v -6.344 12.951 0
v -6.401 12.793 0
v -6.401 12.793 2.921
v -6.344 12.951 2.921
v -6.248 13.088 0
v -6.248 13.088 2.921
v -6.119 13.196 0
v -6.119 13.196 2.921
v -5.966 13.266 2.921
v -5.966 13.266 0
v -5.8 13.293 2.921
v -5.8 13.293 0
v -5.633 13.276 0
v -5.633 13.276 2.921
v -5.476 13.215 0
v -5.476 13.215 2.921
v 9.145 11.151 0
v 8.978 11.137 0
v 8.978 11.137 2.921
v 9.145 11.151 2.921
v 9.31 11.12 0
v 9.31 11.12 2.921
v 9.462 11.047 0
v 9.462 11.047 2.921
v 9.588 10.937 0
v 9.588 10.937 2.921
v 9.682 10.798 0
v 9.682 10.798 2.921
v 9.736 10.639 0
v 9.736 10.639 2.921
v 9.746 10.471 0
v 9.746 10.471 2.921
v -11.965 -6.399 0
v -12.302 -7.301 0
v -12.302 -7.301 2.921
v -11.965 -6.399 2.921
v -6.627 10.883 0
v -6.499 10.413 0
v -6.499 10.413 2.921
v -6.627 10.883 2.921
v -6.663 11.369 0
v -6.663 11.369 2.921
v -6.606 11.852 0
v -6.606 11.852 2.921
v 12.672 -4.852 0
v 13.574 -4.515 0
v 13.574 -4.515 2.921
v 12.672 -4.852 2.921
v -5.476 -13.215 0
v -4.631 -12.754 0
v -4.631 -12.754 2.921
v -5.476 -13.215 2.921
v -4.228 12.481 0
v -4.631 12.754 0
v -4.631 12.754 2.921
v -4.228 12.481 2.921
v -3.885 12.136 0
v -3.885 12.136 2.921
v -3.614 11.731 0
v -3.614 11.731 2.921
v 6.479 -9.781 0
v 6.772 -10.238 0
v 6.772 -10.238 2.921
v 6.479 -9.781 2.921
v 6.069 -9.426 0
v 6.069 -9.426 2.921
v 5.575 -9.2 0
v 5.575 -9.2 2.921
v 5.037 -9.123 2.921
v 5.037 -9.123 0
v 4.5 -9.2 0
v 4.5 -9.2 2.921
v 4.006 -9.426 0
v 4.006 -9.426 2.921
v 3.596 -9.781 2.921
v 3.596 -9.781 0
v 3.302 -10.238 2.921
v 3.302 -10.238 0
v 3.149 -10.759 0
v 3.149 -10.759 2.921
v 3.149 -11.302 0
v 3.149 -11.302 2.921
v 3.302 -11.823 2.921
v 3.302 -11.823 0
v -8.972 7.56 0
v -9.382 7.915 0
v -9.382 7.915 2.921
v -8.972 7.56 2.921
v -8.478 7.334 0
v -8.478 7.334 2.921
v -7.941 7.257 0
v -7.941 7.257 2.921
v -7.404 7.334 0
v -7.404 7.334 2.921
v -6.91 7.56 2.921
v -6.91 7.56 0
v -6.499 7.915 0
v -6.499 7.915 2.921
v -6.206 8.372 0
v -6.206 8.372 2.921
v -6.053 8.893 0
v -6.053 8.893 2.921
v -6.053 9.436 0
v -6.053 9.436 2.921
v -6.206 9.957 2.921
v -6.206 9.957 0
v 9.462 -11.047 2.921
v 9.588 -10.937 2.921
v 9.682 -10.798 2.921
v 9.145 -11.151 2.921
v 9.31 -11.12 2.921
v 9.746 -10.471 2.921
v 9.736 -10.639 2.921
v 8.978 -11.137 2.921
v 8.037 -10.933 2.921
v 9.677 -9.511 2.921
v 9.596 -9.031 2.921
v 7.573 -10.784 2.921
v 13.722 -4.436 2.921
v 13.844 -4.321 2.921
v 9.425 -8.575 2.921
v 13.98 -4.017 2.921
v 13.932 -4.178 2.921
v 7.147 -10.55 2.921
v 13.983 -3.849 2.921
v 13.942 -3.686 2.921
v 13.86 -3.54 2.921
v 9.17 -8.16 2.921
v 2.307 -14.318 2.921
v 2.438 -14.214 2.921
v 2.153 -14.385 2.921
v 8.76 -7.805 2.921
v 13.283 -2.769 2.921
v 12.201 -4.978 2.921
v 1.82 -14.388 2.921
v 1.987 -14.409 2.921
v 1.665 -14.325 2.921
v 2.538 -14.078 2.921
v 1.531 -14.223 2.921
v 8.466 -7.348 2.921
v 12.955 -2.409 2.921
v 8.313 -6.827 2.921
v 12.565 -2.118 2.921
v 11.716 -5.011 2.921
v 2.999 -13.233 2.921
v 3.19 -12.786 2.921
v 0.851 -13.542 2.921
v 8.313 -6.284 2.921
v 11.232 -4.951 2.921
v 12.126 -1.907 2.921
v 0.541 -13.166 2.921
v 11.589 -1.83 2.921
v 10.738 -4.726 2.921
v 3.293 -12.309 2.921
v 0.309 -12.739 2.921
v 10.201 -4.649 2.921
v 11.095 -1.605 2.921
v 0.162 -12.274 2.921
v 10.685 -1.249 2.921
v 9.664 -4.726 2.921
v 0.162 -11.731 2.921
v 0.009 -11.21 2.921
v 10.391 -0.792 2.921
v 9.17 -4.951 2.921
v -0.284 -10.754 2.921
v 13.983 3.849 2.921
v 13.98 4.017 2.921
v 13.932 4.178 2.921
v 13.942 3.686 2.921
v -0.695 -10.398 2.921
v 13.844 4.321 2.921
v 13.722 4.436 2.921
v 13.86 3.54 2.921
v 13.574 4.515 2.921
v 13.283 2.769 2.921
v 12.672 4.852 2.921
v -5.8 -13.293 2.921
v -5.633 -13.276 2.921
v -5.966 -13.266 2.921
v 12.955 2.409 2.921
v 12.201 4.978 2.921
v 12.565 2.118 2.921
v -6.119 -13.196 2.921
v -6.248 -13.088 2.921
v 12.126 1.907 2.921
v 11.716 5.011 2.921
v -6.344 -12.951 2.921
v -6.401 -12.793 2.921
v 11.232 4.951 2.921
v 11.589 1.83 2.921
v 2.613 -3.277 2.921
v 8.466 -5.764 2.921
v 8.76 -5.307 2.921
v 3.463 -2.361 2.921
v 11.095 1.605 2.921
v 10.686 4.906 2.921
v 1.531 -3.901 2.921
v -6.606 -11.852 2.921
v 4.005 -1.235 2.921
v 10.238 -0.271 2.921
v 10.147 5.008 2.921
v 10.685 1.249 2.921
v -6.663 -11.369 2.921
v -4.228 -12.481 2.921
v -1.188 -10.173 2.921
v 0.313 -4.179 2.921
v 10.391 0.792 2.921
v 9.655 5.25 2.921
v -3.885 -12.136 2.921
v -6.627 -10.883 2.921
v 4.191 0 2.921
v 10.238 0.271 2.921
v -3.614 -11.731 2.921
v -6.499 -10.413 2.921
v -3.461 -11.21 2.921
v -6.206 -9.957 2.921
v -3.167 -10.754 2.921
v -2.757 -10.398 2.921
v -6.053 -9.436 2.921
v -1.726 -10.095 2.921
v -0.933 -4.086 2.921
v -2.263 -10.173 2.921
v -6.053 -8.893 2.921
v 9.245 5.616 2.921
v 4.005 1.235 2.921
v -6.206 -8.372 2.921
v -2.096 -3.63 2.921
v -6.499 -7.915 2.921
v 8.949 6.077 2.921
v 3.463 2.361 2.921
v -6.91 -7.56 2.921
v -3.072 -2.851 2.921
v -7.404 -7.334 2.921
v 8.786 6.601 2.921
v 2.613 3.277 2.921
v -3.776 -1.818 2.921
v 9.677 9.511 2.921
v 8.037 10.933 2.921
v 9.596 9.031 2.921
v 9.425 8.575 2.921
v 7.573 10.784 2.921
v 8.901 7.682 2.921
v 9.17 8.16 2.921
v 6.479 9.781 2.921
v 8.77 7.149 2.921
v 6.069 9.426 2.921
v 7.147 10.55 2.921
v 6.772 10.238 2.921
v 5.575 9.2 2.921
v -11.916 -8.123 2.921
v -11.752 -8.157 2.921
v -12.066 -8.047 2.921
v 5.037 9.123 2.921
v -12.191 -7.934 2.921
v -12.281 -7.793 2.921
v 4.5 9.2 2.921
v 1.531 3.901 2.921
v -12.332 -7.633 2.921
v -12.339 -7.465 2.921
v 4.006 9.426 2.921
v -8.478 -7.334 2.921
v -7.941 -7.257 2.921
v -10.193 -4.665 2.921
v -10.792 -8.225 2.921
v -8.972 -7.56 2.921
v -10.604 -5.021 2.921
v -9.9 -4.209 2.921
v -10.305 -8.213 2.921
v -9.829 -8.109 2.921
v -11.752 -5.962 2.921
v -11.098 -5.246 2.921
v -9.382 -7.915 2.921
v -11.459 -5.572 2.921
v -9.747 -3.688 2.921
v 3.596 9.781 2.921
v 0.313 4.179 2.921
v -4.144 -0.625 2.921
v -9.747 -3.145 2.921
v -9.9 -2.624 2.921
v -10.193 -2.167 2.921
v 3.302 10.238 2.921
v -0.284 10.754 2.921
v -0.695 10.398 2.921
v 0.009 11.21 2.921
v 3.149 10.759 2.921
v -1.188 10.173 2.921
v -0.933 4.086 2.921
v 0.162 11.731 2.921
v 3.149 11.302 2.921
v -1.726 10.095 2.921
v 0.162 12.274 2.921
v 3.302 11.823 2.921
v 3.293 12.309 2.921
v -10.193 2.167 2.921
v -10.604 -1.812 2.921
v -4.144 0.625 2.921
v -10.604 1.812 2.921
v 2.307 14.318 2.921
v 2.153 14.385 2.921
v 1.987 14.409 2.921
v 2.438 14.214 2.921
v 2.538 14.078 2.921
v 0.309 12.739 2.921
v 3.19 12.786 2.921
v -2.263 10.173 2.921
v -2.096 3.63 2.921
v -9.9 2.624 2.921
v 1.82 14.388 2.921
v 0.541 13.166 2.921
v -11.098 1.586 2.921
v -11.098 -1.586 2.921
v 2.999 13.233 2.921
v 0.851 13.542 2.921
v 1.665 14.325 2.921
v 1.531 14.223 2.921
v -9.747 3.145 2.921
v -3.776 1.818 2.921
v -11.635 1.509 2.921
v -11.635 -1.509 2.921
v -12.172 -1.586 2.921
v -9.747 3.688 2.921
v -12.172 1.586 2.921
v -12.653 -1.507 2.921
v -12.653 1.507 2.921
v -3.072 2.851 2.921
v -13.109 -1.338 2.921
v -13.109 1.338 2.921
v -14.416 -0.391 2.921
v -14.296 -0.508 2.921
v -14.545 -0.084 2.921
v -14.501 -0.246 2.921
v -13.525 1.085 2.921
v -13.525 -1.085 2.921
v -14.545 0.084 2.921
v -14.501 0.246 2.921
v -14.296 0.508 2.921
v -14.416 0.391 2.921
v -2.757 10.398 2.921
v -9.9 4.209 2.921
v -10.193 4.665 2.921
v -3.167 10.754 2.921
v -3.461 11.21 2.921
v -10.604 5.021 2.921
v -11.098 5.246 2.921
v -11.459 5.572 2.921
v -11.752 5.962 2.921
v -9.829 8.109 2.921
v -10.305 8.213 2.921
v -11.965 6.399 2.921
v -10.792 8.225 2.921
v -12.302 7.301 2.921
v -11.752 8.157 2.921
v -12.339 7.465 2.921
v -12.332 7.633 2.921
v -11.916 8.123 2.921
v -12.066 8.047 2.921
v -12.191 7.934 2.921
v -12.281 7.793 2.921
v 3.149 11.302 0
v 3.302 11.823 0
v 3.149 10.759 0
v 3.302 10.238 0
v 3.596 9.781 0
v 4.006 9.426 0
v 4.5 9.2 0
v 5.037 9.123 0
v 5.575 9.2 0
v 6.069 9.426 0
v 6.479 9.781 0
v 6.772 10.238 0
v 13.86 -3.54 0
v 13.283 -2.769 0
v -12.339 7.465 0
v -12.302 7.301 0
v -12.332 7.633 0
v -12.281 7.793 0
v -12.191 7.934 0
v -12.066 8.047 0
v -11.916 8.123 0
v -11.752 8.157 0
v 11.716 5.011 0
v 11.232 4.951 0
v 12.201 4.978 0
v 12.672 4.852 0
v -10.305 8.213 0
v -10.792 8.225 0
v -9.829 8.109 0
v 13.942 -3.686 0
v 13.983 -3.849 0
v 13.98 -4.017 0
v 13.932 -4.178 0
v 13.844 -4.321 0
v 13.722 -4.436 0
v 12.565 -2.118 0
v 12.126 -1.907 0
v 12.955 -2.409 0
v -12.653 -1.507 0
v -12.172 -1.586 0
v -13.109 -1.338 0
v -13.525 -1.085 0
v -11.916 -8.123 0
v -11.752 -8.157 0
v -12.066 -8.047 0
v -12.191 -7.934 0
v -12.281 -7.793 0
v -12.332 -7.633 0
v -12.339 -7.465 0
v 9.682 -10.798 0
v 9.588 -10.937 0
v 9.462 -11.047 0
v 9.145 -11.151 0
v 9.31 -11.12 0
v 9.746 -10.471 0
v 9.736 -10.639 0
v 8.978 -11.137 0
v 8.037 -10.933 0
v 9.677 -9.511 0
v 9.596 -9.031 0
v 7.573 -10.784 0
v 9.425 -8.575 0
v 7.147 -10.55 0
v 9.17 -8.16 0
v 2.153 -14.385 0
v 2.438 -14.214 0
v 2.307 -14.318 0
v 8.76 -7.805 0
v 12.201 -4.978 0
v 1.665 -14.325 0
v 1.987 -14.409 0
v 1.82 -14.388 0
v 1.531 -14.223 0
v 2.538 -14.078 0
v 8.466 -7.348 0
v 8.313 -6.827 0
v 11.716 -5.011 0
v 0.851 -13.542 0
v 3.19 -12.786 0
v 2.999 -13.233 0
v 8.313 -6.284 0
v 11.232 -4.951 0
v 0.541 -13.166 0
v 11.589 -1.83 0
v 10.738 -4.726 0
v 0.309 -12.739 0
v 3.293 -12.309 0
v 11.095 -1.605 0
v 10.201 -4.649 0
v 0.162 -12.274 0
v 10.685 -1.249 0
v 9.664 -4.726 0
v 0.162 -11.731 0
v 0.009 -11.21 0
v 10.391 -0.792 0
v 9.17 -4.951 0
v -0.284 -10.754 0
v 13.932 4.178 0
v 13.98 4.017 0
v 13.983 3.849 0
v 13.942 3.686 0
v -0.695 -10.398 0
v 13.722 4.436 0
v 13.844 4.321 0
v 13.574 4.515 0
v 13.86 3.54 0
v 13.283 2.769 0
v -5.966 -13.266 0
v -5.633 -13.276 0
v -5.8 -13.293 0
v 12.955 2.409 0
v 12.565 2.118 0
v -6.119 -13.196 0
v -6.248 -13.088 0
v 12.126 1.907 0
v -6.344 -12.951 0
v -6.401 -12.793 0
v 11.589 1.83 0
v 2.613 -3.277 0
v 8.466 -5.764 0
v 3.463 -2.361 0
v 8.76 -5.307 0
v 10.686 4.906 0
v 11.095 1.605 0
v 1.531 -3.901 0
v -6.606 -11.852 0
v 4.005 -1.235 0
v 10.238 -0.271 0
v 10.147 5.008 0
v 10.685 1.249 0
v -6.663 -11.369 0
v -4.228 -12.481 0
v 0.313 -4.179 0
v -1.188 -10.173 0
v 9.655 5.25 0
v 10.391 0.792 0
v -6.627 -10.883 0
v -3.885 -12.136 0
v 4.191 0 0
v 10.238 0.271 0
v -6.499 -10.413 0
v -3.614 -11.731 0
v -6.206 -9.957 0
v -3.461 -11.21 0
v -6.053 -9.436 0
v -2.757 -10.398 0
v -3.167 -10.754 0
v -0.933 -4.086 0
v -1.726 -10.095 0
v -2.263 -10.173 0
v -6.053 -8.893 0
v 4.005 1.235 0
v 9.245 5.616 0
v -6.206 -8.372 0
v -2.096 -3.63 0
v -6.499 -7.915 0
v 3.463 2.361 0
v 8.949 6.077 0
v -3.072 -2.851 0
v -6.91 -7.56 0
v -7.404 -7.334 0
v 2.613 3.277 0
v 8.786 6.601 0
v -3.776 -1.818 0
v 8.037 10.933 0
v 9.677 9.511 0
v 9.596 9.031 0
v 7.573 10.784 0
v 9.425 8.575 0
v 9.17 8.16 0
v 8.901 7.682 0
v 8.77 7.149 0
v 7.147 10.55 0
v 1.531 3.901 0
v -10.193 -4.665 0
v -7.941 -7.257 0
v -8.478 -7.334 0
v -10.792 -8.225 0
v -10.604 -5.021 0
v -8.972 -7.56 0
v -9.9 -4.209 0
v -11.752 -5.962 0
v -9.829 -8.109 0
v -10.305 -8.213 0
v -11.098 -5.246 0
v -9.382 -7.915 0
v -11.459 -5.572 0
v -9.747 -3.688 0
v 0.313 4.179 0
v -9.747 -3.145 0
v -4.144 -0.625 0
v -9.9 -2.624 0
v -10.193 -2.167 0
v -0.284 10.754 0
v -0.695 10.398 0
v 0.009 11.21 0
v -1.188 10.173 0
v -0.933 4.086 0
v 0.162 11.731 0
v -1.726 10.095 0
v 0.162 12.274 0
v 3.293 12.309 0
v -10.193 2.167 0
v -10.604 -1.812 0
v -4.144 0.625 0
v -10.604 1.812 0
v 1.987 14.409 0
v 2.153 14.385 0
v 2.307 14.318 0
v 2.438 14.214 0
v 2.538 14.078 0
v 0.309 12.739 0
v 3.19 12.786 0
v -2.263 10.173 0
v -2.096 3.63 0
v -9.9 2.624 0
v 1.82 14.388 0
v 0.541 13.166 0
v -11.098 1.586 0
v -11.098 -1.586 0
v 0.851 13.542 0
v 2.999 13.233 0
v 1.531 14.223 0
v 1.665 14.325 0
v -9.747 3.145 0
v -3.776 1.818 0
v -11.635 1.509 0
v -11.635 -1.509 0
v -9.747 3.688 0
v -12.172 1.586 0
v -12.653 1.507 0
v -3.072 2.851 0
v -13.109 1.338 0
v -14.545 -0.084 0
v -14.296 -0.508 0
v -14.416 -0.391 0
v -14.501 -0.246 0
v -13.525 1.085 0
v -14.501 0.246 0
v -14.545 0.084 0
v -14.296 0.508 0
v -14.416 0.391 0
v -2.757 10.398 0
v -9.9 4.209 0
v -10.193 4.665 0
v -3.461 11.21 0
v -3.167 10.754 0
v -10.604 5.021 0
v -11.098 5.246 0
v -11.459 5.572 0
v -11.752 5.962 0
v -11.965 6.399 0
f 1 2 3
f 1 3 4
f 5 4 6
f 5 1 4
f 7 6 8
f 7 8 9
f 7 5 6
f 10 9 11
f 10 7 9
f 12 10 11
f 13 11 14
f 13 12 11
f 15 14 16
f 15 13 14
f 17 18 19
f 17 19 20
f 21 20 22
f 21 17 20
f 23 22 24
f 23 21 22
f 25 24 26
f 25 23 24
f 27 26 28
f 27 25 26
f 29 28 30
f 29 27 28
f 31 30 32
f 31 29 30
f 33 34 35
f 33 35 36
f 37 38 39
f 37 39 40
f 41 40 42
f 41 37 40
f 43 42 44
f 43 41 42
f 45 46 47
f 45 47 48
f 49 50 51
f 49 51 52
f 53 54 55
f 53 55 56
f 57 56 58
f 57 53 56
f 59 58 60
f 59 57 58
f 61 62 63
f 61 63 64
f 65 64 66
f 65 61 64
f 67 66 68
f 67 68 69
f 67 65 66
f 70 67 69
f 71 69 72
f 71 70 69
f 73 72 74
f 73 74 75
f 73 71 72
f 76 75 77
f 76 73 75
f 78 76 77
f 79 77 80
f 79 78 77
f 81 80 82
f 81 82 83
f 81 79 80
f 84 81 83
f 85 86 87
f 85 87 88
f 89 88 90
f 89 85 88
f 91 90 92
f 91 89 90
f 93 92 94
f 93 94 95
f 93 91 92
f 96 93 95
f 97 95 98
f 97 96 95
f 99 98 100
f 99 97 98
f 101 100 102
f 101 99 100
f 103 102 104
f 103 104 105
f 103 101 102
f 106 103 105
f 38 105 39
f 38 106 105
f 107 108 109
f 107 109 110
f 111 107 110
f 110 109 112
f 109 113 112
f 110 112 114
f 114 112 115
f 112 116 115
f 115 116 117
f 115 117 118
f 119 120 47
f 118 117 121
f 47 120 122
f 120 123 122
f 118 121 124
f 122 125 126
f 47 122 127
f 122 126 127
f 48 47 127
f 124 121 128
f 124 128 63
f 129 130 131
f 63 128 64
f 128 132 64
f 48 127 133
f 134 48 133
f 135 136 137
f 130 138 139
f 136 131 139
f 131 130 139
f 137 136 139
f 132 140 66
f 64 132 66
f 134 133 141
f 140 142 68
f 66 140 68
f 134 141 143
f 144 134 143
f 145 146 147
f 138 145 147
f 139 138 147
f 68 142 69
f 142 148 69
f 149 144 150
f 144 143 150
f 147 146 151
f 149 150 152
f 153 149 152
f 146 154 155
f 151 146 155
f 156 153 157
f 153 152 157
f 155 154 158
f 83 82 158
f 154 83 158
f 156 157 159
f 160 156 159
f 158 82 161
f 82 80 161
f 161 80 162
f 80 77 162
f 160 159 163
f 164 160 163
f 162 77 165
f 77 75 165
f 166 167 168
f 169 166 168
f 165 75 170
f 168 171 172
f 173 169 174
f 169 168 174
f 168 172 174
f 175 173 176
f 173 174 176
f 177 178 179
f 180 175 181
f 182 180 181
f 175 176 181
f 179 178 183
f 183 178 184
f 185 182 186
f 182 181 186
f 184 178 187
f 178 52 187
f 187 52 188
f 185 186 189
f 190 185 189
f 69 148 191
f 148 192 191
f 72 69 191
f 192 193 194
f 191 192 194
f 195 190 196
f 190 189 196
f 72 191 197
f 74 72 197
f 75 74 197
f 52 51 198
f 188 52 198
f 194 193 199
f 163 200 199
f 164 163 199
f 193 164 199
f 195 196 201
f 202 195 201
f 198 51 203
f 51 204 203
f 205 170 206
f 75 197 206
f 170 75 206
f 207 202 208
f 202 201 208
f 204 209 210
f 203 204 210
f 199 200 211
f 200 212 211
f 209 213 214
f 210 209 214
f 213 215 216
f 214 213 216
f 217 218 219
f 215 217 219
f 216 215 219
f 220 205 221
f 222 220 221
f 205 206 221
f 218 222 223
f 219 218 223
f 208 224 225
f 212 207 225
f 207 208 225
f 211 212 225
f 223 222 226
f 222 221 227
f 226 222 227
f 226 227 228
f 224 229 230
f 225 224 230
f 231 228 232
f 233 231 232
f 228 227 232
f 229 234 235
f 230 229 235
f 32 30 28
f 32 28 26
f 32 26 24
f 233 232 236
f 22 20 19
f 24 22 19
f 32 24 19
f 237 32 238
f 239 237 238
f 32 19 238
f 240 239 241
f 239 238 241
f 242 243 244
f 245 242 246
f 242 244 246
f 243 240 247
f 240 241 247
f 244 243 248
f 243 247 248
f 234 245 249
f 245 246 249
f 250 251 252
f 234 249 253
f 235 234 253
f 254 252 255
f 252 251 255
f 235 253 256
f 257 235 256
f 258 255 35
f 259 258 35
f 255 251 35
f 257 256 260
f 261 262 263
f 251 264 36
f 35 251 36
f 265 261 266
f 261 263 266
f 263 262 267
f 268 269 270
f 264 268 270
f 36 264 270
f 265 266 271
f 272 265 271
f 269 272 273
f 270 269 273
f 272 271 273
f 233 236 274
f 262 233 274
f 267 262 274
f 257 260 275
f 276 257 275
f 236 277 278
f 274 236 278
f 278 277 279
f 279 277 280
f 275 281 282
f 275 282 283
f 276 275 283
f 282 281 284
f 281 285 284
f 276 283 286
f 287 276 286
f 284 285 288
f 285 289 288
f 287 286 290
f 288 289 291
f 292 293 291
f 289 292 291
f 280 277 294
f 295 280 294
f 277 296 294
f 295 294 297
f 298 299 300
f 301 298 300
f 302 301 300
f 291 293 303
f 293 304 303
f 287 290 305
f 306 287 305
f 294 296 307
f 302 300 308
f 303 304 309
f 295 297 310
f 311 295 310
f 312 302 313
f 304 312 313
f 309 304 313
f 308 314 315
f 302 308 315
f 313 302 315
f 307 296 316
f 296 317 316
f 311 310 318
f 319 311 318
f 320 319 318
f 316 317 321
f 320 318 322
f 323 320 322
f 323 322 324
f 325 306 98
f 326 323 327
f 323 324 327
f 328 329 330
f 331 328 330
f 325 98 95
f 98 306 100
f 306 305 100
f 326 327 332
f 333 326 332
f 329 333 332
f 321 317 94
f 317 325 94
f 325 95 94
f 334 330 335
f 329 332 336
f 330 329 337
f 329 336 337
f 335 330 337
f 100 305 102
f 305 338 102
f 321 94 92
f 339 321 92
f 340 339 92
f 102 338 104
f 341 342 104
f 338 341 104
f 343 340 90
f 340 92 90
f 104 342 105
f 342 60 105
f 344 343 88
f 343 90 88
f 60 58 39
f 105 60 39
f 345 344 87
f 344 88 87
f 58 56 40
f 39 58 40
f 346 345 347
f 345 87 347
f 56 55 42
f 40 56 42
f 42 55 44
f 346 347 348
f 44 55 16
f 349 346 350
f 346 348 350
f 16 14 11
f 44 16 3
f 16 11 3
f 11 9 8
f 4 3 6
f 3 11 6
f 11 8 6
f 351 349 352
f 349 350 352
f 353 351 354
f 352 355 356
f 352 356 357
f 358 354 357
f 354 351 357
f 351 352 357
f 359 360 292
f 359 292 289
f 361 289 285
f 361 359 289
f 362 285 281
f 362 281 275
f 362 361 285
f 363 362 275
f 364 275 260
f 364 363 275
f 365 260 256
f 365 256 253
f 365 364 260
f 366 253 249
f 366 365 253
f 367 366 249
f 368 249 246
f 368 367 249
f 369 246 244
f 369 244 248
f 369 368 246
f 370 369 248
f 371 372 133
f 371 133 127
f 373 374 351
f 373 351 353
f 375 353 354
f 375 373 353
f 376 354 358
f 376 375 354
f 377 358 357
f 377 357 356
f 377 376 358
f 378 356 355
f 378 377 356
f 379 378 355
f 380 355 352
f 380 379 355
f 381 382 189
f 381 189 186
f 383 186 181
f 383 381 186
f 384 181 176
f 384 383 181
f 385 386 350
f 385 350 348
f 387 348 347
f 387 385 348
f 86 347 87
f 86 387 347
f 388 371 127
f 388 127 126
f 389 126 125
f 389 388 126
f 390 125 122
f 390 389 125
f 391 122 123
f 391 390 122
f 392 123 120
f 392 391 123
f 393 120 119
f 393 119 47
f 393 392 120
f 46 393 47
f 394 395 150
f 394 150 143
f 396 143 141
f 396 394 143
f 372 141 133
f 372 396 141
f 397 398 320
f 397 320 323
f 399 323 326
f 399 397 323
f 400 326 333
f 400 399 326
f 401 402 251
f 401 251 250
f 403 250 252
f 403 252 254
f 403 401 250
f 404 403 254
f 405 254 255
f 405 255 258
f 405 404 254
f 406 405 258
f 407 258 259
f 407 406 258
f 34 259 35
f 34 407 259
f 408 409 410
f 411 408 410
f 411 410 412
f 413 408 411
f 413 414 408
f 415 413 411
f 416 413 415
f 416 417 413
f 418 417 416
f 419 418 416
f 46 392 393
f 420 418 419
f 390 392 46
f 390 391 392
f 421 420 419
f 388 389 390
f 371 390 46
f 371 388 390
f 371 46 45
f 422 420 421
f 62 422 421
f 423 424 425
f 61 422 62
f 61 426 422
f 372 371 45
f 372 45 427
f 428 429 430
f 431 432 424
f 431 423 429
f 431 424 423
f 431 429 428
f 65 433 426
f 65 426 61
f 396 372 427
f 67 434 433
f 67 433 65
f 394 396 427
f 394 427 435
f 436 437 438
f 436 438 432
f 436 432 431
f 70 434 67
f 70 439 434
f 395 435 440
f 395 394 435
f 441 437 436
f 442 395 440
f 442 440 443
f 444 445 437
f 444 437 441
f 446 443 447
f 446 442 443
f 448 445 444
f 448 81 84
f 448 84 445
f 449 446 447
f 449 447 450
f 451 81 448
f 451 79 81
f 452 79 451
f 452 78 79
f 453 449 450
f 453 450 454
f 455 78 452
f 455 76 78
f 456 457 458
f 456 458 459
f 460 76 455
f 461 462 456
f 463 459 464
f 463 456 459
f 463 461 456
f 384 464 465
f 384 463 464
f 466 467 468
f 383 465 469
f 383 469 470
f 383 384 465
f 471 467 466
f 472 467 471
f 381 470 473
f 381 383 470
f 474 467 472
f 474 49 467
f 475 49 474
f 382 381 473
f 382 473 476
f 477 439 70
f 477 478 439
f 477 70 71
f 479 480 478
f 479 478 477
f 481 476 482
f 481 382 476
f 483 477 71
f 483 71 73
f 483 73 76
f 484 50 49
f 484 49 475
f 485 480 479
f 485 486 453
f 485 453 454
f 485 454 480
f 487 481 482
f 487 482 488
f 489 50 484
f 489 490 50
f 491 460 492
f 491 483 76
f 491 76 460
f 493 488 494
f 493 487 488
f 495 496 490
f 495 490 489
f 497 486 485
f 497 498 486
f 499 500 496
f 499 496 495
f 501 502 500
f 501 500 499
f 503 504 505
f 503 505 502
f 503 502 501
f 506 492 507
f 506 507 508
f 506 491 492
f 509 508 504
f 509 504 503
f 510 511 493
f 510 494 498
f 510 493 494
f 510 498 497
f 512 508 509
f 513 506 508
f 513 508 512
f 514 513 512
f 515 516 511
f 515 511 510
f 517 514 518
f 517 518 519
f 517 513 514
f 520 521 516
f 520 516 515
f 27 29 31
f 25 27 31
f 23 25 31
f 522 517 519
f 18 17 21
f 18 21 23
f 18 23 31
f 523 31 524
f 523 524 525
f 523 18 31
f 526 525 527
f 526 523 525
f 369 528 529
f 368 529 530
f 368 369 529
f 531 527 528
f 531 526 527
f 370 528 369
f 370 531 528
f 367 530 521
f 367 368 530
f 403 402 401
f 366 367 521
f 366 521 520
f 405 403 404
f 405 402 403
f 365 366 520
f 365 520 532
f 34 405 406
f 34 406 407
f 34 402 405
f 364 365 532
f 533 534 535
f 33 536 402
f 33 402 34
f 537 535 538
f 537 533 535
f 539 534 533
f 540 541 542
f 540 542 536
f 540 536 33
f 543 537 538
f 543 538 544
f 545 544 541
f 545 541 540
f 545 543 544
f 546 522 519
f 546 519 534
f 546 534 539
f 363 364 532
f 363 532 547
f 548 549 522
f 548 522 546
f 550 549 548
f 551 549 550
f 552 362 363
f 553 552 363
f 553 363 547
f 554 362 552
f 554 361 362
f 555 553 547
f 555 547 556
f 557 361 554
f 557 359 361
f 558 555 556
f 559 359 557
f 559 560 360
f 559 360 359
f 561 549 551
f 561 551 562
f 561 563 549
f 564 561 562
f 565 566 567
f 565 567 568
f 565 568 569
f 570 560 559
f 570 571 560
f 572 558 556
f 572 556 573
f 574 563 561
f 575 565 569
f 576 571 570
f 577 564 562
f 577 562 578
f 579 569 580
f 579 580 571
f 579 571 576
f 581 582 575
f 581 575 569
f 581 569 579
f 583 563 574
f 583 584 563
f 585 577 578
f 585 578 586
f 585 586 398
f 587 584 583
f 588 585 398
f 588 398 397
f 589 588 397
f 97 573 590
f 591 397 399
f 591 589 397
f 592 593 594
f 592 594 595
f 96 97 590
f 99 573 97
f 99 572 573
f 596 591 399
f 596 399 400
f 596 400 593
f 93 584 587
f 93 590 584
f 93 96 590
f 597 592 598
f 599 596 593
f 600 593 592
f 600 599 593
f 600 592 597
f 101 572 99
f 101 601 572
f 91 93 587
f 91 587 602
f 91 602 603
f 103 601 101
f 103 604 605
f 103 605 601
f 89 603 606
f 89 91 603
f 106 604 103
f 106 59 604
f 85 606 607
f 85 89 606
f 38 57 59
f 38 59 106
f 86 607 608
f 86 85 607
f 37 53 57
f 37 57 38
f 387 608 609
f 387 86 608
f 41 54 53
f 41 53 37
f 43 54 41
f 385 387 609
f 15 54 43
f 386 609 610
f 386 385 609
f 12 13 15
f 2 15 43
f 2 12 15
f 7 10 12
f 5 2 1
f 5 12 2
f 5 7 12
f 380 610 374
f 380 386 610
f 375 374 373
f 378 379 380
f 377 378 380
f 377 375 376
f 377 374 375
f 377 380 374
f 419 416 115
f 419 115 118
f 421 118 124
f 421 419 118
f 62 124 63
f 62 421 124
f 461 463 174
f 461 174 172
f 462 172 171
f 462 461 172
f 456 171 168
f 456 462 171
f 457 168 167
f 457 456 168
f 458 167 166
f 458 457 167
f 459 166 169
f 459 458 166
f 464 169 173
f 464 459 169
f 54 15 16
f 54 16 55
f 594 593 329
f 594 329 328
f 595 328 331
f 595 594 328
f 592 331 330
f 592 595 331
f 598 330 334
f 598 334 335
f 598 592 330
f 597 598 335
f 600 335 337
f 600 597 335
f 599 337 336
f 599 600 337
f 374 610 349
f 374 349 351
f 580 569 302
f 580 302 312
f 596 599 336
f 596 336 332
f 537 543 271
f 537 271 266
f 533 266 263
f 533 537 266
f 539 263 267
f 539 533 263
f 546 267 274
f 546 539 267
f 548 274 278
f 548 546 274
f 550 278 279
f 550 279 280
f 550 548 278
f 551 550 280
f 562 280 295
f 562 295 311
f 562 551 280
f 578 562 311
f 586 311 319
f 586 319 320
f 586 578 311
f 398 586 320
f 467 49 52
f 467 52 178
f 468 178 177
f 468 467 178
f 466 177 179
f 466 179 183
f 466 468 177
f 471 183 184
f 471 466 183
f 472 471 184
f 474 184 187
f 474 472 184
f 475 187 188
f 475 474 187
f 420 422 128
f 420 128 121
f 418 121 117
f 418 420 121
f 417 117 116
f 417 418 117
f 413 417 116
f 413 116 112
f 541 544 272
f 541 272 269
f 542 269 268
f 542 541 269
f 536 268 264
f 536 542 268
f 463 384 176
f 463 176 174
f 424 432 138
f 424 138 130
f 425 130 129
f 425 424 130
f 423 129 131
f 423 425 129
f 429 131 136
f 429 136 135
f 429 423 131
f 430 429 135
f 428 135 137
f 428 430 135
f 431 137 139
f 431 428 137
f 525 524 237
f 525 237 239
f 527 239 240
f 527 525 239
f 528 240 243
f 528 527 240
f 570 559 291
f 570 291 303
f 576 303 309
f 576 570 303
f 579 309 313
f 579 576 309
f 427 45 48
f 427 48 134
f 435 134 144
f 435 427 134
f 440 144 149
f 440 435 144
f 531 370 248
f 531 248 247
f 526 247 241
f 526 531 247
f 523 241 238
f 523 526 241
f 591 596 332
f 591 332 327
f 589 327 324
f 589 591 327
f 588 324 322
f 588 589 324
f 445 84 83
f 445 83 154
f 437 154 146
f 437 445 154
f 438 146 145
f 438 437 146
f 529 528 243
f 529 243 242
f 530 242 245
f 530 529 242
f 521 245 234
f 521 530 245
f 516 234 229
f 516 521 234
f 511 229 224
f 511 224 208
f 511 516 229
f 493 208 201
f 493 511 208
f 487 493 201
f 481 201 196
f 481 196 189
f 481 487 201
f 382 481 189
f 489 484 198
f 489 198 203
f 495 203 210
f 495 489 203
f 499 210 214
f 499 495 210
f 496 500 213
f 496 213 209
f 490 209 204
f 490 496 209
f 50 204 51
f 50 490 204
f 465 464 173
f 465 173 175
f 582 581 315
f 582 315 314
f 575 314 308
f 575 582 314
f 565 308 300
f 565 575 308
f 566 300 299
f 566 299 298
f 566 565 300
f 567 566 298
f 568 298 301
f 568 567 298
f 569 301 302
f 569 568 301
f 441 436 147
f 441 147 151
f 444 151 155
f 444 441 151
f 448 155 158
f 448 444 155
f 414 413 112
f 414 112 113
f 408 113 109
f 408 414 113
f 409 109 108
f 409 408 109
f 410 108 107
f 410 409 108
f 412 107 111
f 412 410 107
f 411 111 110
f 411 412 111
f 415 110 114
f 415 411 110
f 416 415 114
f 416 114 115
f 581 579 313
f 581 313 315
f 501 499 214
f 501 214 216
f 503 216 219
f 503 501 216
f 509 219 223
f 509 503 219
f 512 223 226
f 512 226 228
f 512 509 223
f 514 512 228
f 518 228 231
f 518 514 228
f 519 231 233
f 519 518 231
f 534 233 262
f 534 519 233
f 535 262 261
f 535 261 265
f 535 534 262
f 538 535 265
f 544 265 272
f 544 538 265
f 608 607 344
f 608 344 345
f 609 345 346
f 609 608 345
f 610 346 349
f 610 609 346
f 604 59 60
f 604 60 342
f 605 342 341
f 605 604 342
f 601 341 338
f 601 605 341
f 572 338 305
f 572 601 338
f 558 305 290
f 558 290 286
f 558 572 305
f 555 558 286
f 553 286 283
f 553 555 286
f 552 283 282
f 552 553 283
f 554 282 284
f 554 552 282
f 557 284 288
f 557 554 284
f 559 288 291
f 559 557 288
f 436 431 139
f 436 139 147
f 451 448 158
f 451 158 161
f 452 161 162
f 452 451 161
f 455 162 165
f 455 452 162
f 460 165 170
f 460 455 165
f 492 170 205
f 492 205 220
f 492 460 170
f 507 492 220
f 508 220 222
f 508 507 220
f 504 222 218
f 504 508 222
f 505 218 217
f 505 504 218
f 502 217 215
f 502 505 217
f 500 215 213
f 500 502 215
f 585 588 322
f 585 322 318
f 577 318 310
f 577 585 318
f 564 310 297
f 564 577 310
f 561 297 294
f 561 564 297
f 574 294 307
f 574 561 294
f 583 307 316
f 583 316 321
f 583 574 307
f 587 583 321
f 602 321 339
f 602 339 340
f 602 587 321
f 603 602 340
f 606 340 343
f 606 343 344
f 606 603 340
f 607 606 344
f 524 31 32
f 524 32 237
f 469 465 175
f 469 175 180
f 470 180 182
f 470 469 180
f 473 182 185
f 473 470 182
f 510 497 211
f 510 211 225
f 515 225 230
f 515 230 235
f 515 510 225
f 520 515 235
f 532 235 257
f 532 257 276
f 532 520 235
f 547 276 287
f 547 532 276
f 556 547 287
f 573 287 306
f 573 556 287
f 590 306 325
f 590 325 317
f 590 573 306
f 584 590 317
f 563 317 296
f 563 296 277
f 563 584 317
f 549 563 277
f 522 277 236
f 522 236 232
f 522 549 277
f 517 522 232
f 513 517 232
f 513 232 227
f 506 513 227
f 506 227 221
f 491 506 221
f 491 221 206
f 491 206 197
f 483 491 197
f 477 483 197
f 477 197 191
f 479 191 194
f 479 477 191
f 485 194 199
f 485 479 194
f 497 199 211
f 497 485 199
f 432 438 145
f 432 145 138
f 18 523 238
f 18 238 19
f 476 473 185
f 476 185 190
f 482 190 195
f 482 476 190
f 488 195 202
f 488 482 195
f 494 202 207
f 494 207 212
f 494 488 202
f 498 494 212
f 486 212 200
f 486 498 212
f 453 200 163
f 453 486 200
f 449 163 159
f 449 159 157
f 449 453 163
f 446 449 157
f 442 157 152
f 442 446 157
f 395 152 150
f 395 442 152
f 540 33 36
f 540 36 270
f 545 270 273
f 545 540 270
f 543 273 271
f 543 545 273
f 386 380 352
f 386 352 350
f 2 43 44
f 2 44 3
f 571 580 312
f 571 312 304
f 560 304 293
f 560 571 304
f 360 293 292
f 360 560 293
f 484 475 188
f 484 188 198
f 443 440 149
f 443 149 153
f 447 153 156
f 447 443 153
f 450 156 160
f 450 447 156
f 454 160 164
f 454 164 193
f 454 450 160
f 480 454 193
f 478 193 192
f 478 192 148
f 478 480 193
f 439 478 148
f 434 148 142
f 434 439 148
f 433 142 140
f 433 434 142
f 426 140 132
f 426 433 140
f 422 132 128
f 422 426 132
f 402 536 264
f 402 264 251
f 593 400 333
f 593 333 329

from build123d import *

# Parameters (mm, degrees)
SKETCH1_R           = 4.191
BOSS_EXTRUDE1_DEPTH = 2.921


with BuildPart() as part:
    # Sketch1 → Boss-Extrude1 (new body)
    with BuildSketch(Plane.XY):
        with BuildLine():
            Line((8.037087805, 10.932568983), (8.977813448, 11.137211321))
            ThreePointArc((8.977813448, 11.137211321), (9.528628972, 10.996624041), (9.746174499, 10.471422679))
            Line((9.746174499, 10.471422679), (9.677494343, 9.511148627))
            ThreePointArc((9.677494343, 9.511148627), (9.521666859, 8.798964182), (9.169962135, 8.160377715))
            ThreePointArc((9.169962135, 8.160377715), (9.081331887, 5.836217624), (11.232280603, 4.95134754))
            ThreePointArc((11.232280603, 4.95134754), (11.959262708, 5.005991004), (12.671821542, 4.851884559))
            Line((12.671821542, 4.851884559), (13.573848312, 4.515445968))
            ThreePointArc((13.573848312, 4.515445968), (13.961216597, 4.099383066), (13.860282246, 3.539941575))
            Line((13.860282246, 3.539941575), (13.283341474, 2.769238931))
            ThreePointArc((13.283341474, 2.769238931), (12.767215072, 2.254357949), (12.126096321, 1.907290757))
            ThreePointArc((12.126096321, 1.907290757), (10.218805564, 0), (12.126096321, -1.907290757))
            ThreePointArc((12.126096321, -1.907290757), (12.767215072, -2.254357949), (13.283341474, -2.769238931))
            Line((13.283341474, -2.769238931), (13.860282246, -3.539941575))
            ThreePointArc((13.860282246, -3.539941575), (13.961216597, -4.099383066), (13.573848312, -4.515445968))
            Line((13.573848312, -4.515445968), (12.671821542, -4.851884559))
            ThreePointArc((12.671821542, -4.851884559), (11.959262708, -5.005991004), (11.232280603, -4.95134754))
            ThreePointArc((11.232280603, -4.95134754), (8.596606282, -5.524703393), (9.169962135, -8.160377715))
            ThreePointArc((9.169962135, -8.160377715), (9.521666859, -8.798964182), (9.677494343, -9.511148627))
            Line((9.677494343, -9.511148627), (9.746174499, -10.471422679))
            ThreePointArc((9.746174499, -10.471422679), (9.528628972, -10.996624041), (8.977813448, -11.137211321))
            Line((8.977813448, -11.137211321), (8.037087805, -10.932568983))
            ThreePointArc((8.037087805, -10.932568983), (7.354328934, -10.676973184), (6.772295158, -10.237967978))
            ThreePointArc((6.772295158, -10.237967978), (4.245045246, -9.295352495), (3.302429764, -11.822602407))
            ThreePointArc((3.302429764, -11.822602407), (3.253056696, -12.549961458), (2.999111137, -13.233335836))
            Line((2.999111137, -13.233335836), (2.537725212, -14.078301071))
            ThreePointArc((2.537725212, -14.078301071), (2.070768976, -14.40251458), (1.531386247, -14.222990771))
            Line((1.531386247, -14.222990771), (0.850635478, -13.542240001))
            ThreePointArc((0.850635478, -13.542240001), (0.414447687, -12.958091818), (0.162153851, -12.27410592))
            ThreePointArc((0.162153851, -12.27410592), (-1.454287661, -10.114792857), (-3.613600724, -11.731234369))
            ThreePointArc((-3.613600724, -11.731234369), (-4.048375984, -12.316434644), (-4.631468665, -12.75403242))
            Line((-4.631468665, -12.75403242), (-5.4764339, -13.215418345))
            ThreePointArc((-5.4764339, -13.215418345), (-6.04454554, -13.235708504), (-6.401245266, -12.793071146))
            Line((-6.401245266, -12.793071146), (-6.605887604, -11.852345504))
            ThreePointArc((-6.605887604, -11.852345504), (-6.657017772, -11.125107857), (-6.499470159, -10.413301958))
            ThreePointArc((-6.499470159, -10.413301958), (-6.691894511, -7.722857955), (-9.382338515, -7.915282308))
            ThreePointArc((-9.382338515, -7.915282308), (-10.064477893, -8.172526855), (-10.79158989, -8.225413826))
            Line((-10.79158989, -8.225413826), (-11.751863943, -8.15673367))
            ThreePointArc((-11.751863943, -8.15673367), (-12.240759555, -7.866658497), (-12.301526637, -7.301441824))
            Line((-12.301526637, -7.301441824), (-11.965088046, -6.399415053))
            ThreePointArc((-11.965088046, -6.399415053), (-11.614927125, -5.759980758), (-11.097558316, -5.246348201))
            ThreePointArc((-11.097558316, -5.246348201), (-9.804872137, -2.878970219), (-12.172250119, -1.586284041))
            ThreePointArc((-12.172250119, -1.586284041), (-12.885179183, -1.433899534), (-13.525457575, -1.08528446))
            Line((-13.525457575, -1.08528446), (-14.296160219, -0.508343688))
            ThreePointArc((-14.296160219, -0.508343688), (-14.5506189, 0), (-14.296160219, 0.508343688))
            Line((-14.296160219, 0.508343688), (-13.525457575, 1.08528446))
            ThreePointArc((-13.525457575, 1.08528446), (-12.885179183, 1.433899534), (-12.172250119, 1.586284041))
            ThreePointArc((-12.172250119, 1.586284041), (-9.804872137, 2.878970219), (-11.097558316, 5.246348201))
            ThreePointArc((-11.097558316, 5.246348201), (-11.614927125, 5.759980758), (-11.965088046, 6.399415053))
            Line((-11.965088046, 6.399415053), (-12.301526637, 7.301441824))
            ThreePointArc((-12.301526637, 7.301441824), (-12.240759555, 7.866658497), (-11.751863943, 8.15673367))
            Line((-11.751863943, 8.15673367), (-10.79158989, 8.225413826))
            ThreePointArc((-10.79158989, 8.225413826), (-10.064477893, 8.172526855), (-9.382338515, 7.915282308))
            ThreePointArc((-9.382338515, 7.915282308), (-6.691894511, 7.722857955), (-6.499470159, 10.413301958))
            ThreePointArc((-6.499470159, 10.413301958), (-6.657017772, 11.125107857), (-6.605887604, 11.852345504))
            Line((-6.605887604, 11.852345504), (-6.401245266, 12.793071146))
            ThreePointArc((-6.401245266, 12.793071146), (-6.04454554, 13.235708504), (-5.4764339, 13.215418345))
            Line((-5.4764339, 13.215418345), (-4.631468665, 12.75403242))
            ThreePointArc((-4.631468665, 12.75403242), (-4.048375984, 12.316434644), (-3.613600724, 11.731234369))
            ThreePointArc((-3.613600724, 11.731234369), (-1.454287661, 10.114792857), (0.162153851, 12.27410592))
            ThreePointArc((0.162153851, 12.27410592), (0.414447687, 12.958091818), (0.850635478, 13.542240001))
            Line((0.850635478, 13.542240001), (1.531386247, 14.222990771))
            ThreePointArc((1.531386247, 14.222990771), (2.070768976, 14.40251458), (2.537725212, 14.078301071))
            Line((2.537725212, 14.078301071), (2.999111137, 13.233335836))
            ThreePointArc((2.999111137, 13.233335836), (3.253056696, 12.549961458), (3.302429764, 11.822602407))
            ThreePointArc((3.302429764, 11.822602407), (4.245045246, 9.295352495), (6.772295158, 10.237967978))
            ThreePointArc((6.772295158, 10.237967978), (7.354328934, 10.676973184), (8.037087805, 10.932568983))
        make_face()
        Circle(SKETCH1_R, mode=Mode.SUBTRACT)
    extrude(amount=BOSS_EXTRUDE1_DEPTH)


solid = part.part
